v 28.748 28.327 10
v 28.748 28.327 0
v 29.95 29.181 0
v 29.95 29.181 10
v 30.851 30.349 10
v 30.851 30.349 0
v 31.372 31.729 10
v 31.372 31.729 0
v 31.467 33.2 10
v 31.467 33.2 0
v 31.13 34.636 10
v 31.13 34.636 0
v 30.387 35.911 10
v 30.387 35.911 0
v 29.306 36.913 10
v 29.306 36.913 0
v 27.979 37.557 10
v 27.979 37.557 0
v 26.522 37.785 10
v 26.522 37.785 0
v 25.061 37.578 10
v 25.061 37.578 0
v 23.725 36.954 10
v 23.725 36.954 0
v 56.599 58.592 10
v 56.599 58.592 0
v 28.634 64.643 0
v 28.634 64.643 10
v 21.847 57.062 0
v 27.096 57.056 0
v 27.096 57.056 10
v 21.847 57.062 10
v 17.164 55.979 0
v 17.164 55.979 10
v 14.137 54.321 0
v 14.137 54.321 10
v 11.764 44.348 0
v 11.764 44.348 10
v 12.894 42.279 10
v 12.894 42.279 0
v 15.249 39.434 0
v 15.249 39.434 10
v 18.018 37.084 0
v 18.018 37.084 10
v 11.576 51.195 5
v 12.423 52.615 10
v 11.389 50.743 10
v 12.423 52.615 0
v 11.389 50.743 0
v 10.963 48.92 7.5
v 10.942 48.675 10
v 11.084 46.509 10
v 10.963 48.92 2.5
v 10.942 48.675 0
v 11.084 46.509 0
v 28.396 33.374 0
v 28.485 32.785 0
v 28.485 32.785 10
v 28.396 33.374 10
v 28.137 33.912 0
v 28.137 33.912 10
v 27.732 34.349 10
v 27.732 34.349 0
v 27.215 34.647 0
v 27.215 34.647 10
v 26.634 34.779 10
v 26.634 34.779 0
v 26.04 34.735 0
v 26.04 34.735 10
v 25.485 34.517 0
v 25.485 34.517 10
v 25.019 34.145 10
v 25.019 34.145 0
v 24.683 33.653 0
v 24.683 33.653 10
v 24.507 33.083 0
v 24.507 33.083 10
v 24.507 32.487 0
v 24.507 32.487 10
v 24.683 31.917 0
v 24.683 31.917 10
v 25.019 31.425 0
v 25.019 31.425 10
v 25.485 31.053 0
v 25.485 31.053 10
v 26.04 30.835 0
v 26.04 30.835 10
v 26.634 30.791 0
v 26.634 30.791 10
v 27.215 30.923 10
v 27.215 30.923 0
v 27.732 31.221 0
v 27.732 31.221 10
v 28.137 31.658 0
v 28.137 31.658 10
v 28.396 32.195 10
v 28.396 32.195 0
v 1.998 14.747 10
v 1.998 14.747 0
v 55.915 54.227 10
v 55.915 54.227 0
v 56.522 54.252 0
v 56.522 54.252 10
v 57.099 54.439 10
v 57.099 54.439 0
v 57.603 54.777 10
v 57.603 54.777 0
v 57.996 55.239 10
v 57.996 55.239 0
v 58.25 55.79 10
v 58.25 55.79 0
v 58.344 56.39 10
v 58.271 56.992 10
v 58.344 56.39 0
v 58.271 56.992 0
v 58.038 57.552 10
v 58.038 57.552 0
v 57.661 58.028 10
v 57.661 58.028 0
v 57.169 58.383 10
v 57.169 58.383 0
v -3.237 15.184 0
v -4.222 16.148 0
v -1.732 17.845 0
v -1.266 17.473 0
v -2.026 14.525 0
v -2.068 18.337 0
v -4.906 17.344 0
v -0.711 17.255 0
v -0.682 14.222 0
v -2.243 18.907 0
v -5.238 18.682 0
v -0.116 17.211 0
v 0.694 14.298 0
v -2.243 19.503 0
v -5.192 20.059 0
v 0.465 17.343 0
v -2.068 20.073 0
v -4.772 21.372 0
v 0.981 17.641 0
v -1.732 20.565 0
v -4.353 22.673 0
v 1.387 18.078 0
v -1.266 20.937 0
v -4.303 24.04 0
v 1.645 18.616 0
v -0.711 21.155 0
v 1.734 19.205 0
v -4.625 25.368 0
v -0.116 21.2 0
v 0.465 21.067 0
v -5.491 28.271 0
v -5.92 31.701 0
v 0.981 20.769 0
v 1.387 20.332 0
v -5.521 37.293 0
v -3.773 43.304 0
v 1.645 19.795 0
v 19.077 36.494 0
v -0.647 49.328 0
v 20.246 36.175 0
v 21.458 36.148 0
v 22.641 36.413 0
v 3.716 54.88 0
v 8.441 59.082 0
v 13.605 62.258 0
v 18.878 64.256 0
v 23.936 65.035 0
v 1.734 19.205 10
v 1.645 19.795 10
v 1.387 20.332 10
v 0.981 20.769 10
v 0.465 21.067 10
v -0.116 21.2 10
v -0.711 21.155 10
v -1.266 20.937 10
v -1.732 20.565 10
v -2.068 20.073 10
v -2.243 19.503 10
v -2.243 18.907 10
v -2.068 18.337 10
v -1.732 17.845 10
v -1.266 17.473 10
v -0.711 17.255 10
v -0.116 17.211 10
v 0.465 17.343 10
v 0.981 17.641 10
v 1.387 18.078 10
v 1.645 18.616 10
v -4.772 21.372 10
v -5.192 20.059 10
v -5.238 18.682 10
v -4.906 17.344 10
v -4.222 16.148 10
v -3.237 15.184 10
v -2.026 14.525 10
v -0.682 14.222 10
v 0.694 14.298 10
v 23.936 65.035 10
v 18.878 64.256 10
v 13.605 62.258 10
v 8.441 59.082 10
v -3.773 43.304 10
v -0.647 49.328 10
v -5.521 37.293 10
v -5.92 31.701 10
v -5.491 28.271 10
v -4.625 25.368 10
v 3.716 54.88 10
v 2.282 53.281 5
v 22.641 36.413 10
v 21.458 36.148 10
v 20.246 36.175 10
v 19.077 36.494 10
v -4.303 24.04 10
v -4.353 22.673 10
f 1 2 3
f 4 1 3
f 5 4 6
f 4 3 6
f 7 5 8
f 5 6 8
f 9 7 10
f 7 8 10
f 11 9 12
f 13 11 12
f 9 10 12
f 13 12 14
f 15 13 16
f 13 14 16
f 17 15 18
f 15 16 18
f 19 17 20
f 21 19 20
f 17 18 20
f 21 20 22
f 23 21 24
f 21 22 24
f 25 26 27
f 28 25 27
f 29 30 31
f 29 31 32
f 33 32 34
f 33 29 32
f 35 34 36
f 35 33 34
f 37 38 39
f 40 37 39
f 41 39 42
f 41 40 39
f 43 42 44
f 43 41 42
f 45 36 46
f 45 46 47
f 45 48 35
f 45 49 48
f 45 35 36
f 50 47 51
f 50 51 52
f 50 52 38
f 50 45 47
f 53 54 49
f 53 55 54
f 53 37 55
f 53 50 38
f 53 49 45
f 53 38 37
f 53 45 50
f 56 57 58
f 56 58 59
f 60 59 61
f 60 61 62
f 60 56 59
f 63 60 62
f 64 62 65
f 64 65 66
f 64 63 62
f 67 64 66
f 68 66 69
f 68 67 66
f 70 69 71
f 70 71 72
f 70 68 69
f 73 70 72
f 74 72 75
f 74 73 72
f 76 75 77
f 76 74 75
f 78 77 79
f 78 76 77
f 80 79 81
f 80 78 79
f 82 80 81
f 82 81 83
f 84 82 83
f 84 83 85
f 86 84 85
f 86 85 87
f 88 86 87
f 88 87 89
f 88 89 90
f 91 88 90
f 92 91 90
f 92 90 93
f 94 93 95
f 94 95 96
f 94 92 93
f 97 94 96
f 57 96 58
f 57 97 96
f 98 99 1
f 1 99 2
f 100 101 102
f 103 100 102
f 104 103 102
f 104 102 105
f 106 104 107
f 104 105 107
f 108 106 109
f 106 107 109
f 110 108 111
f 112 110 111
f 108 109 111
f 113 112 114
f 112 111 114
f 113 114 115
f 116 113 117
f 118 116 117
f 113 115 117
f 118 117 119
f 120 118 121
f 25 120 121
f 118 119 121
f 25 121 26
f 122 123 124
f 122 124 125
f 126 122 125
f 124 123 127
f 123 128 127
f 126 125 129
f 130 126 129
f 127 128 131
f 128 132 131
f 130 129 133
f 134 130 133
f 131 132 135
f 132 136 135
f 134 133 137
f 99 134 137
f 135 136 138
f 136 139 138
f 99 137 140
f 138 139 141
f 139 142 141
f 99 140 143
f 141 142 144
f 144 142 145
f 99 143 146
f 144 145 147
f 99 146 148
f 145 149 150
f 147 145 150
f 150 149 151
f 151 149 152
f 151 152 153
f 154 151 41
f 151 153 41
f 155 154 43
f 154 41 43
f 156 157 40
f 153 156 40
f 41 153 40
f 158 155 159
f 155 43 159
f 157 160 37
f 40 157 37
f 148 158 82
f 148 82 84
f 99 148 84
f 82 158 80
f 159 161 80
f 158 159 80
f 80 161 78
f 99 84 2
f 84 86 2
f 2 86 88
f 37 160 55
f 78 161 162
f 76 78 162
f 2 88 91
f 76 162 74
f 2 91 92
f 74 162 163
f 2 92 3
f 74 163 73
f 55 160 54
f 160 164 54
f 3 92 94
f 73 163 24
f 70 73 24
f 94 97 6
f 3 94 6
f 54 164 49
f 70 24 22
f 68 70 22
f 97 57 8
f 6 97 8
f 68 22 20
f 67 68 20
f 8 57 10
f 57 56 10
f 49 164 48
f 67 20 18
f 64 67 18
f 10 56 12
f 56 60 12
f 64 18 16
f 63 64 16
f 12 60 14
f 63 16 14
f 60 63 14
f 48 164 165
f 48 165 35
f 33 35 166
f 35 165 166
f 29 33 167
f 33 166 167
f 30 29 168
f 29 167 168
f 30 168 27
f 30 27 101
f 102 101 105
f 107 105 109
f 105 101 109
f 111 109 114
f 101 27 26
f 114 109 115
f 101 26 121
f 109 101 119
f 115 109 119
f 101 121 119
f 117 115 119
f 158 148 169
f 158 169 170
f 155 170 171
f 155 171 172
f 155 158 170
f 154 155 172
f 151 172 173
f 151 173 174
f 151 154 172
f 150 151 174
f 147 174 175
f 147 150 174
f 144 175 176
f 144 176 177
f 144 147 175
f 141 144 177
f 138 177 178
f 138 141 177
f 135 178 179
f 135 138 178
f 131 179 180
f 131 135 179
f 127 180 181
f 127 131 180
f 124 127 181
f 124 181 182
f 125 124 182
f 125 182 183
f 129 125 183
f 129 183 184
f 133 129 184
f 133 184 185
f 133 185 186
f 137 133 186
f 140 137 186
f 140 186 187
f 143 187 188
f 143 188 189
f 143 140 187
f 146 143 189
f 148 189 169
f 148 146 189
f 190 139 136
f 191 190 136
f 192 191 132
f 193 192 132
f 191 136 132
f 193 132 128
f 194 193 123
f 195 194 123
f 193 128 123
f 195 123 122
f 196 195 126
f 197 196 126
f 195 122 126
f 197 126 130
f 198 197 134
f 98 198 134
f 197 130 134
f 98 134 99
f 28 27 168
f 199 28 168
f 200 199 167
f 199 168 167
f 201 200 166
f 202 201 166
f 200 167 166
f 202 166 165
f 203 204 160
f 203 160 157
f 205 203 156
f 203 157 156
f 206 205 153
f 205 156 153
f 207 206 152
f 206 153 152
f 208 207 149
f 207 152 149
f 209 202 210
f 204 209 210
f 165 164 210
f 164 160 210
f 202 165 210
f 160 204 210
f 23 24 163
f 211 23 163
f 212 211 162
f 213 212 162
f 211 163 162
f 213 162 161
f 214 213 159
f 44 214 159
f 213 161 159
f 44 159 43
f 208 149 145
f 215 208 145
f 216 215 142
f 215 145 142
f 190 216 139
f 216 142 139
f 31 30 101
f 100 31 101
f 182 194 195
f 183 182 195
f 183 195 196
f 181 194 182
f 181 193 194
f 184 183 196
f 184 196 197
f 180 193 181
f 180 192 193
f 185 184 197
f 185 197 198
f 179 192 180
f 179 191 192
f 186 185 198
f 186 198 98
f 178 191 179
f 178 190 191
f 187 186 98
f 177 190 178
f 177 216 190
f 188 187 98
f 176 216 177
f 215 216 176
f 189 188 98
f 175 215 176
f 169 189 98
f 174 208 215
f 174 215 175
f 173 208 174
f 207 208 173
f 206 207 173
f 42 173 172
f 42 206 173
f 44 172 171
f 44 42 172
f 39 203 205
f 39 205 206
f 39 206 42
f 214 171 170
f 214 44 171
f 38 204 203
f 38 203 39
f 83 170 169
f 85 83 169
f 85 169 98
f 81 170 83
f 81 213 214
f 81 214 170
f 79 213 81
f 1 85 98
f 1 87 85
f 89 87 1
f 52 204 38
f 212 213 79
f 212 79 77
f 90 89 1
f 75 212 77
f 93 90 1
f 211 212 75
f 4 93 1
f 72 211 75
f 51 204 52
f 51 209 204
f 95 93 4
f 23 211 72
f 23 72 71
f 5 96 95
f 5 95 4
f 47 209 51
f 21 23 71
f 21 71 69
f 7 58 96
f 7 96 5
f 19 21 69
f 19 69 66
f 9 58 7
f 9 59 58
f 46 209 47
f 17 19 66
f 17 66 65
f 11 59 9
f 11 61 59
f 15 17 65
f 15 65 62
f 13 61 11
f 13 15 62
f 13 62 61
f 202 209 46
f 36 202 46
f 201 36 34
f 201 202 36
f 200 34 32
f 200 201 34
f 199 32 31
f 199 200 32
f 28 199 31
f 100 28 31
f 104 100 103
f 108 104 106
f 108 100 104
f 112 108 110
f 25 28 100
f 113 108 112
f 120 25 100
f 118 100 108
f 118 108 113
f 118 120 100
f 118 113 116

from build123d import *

# Parameters (mm, degrees)
SKETCH1_R           = 2
BOSS_EXTRUDE1_DEPTH = 10


with BuildPart() as part:
    # Sketch1 → Boss-Extrude1 (new body)
    with BuildSketch(Plane.XY):
        with BuildLine():
            Line((1.997609294, 14.746687389), (28.748065289, 28.326566036))
            ThreePointArc((28.748065289, 28.326566036), (30.805734405, 35.300748137), (23.724834089, 36.954250141))
            ThreePointArc((23.724834089, 36.954250141), (20.851278613, 36.124816425), (18.018383872, 37.083976864))
            add(Edge.make_bspline(
                [(27.096341183, 57.0558637), (-15.03027812, 61.190372697), (18.018383872, 37.083976864)],
                knots=[5.074507124, 5.074507124, 5.074507124, 7.365213451, 7.365213451, 7.365213451], degree=2, weights=[1, 0.41272448, 1]))
            Line((27.096341183, 57.0558637), (55.915354023, 54.227427195))
            ThreePointArc((55.915354023, 54.227427195), (58.317172637, 56.086683182), (56.599353473, 58.591610886))
            Line((56.599353473, 58.591610886), (28.633722858, 64.642950152))
            add(Edge.make_bspline(
                [(28.633722858, 64.642950152), (-24.600856245, 76.162107481), (-4.624928751, 25.368416784)],
                knots=[3.507798101, 3.507798101, 3.507798101, 5.909316529, 5.909316529, 5.909316529], degree=2, weights=[1, 0.361650033, 1]))
            ThreePointArc((-4.624928751, 25.368416784), (-4.281398653, 23.35476873), (-4.7718634, 21.371782158))
            ThreePointArc((-4.7718634, 21.371782158), (-3.762925605, 15.631661435), (1.997609294, 14.746687389))
        make_face()
        with Locations((-0.265703814, 19.205096721)):
            Circle(SKETCH1_R, mode=Mode.SUBTRACT)
        with Locations((26.484752181, 32.784975369)):
            Circle(SKETCH1_R, mode=Mode.SUBTRACT)
    extrude(amount=BOSS_EXTRUDE1_DEPTH)


solid = part.part
